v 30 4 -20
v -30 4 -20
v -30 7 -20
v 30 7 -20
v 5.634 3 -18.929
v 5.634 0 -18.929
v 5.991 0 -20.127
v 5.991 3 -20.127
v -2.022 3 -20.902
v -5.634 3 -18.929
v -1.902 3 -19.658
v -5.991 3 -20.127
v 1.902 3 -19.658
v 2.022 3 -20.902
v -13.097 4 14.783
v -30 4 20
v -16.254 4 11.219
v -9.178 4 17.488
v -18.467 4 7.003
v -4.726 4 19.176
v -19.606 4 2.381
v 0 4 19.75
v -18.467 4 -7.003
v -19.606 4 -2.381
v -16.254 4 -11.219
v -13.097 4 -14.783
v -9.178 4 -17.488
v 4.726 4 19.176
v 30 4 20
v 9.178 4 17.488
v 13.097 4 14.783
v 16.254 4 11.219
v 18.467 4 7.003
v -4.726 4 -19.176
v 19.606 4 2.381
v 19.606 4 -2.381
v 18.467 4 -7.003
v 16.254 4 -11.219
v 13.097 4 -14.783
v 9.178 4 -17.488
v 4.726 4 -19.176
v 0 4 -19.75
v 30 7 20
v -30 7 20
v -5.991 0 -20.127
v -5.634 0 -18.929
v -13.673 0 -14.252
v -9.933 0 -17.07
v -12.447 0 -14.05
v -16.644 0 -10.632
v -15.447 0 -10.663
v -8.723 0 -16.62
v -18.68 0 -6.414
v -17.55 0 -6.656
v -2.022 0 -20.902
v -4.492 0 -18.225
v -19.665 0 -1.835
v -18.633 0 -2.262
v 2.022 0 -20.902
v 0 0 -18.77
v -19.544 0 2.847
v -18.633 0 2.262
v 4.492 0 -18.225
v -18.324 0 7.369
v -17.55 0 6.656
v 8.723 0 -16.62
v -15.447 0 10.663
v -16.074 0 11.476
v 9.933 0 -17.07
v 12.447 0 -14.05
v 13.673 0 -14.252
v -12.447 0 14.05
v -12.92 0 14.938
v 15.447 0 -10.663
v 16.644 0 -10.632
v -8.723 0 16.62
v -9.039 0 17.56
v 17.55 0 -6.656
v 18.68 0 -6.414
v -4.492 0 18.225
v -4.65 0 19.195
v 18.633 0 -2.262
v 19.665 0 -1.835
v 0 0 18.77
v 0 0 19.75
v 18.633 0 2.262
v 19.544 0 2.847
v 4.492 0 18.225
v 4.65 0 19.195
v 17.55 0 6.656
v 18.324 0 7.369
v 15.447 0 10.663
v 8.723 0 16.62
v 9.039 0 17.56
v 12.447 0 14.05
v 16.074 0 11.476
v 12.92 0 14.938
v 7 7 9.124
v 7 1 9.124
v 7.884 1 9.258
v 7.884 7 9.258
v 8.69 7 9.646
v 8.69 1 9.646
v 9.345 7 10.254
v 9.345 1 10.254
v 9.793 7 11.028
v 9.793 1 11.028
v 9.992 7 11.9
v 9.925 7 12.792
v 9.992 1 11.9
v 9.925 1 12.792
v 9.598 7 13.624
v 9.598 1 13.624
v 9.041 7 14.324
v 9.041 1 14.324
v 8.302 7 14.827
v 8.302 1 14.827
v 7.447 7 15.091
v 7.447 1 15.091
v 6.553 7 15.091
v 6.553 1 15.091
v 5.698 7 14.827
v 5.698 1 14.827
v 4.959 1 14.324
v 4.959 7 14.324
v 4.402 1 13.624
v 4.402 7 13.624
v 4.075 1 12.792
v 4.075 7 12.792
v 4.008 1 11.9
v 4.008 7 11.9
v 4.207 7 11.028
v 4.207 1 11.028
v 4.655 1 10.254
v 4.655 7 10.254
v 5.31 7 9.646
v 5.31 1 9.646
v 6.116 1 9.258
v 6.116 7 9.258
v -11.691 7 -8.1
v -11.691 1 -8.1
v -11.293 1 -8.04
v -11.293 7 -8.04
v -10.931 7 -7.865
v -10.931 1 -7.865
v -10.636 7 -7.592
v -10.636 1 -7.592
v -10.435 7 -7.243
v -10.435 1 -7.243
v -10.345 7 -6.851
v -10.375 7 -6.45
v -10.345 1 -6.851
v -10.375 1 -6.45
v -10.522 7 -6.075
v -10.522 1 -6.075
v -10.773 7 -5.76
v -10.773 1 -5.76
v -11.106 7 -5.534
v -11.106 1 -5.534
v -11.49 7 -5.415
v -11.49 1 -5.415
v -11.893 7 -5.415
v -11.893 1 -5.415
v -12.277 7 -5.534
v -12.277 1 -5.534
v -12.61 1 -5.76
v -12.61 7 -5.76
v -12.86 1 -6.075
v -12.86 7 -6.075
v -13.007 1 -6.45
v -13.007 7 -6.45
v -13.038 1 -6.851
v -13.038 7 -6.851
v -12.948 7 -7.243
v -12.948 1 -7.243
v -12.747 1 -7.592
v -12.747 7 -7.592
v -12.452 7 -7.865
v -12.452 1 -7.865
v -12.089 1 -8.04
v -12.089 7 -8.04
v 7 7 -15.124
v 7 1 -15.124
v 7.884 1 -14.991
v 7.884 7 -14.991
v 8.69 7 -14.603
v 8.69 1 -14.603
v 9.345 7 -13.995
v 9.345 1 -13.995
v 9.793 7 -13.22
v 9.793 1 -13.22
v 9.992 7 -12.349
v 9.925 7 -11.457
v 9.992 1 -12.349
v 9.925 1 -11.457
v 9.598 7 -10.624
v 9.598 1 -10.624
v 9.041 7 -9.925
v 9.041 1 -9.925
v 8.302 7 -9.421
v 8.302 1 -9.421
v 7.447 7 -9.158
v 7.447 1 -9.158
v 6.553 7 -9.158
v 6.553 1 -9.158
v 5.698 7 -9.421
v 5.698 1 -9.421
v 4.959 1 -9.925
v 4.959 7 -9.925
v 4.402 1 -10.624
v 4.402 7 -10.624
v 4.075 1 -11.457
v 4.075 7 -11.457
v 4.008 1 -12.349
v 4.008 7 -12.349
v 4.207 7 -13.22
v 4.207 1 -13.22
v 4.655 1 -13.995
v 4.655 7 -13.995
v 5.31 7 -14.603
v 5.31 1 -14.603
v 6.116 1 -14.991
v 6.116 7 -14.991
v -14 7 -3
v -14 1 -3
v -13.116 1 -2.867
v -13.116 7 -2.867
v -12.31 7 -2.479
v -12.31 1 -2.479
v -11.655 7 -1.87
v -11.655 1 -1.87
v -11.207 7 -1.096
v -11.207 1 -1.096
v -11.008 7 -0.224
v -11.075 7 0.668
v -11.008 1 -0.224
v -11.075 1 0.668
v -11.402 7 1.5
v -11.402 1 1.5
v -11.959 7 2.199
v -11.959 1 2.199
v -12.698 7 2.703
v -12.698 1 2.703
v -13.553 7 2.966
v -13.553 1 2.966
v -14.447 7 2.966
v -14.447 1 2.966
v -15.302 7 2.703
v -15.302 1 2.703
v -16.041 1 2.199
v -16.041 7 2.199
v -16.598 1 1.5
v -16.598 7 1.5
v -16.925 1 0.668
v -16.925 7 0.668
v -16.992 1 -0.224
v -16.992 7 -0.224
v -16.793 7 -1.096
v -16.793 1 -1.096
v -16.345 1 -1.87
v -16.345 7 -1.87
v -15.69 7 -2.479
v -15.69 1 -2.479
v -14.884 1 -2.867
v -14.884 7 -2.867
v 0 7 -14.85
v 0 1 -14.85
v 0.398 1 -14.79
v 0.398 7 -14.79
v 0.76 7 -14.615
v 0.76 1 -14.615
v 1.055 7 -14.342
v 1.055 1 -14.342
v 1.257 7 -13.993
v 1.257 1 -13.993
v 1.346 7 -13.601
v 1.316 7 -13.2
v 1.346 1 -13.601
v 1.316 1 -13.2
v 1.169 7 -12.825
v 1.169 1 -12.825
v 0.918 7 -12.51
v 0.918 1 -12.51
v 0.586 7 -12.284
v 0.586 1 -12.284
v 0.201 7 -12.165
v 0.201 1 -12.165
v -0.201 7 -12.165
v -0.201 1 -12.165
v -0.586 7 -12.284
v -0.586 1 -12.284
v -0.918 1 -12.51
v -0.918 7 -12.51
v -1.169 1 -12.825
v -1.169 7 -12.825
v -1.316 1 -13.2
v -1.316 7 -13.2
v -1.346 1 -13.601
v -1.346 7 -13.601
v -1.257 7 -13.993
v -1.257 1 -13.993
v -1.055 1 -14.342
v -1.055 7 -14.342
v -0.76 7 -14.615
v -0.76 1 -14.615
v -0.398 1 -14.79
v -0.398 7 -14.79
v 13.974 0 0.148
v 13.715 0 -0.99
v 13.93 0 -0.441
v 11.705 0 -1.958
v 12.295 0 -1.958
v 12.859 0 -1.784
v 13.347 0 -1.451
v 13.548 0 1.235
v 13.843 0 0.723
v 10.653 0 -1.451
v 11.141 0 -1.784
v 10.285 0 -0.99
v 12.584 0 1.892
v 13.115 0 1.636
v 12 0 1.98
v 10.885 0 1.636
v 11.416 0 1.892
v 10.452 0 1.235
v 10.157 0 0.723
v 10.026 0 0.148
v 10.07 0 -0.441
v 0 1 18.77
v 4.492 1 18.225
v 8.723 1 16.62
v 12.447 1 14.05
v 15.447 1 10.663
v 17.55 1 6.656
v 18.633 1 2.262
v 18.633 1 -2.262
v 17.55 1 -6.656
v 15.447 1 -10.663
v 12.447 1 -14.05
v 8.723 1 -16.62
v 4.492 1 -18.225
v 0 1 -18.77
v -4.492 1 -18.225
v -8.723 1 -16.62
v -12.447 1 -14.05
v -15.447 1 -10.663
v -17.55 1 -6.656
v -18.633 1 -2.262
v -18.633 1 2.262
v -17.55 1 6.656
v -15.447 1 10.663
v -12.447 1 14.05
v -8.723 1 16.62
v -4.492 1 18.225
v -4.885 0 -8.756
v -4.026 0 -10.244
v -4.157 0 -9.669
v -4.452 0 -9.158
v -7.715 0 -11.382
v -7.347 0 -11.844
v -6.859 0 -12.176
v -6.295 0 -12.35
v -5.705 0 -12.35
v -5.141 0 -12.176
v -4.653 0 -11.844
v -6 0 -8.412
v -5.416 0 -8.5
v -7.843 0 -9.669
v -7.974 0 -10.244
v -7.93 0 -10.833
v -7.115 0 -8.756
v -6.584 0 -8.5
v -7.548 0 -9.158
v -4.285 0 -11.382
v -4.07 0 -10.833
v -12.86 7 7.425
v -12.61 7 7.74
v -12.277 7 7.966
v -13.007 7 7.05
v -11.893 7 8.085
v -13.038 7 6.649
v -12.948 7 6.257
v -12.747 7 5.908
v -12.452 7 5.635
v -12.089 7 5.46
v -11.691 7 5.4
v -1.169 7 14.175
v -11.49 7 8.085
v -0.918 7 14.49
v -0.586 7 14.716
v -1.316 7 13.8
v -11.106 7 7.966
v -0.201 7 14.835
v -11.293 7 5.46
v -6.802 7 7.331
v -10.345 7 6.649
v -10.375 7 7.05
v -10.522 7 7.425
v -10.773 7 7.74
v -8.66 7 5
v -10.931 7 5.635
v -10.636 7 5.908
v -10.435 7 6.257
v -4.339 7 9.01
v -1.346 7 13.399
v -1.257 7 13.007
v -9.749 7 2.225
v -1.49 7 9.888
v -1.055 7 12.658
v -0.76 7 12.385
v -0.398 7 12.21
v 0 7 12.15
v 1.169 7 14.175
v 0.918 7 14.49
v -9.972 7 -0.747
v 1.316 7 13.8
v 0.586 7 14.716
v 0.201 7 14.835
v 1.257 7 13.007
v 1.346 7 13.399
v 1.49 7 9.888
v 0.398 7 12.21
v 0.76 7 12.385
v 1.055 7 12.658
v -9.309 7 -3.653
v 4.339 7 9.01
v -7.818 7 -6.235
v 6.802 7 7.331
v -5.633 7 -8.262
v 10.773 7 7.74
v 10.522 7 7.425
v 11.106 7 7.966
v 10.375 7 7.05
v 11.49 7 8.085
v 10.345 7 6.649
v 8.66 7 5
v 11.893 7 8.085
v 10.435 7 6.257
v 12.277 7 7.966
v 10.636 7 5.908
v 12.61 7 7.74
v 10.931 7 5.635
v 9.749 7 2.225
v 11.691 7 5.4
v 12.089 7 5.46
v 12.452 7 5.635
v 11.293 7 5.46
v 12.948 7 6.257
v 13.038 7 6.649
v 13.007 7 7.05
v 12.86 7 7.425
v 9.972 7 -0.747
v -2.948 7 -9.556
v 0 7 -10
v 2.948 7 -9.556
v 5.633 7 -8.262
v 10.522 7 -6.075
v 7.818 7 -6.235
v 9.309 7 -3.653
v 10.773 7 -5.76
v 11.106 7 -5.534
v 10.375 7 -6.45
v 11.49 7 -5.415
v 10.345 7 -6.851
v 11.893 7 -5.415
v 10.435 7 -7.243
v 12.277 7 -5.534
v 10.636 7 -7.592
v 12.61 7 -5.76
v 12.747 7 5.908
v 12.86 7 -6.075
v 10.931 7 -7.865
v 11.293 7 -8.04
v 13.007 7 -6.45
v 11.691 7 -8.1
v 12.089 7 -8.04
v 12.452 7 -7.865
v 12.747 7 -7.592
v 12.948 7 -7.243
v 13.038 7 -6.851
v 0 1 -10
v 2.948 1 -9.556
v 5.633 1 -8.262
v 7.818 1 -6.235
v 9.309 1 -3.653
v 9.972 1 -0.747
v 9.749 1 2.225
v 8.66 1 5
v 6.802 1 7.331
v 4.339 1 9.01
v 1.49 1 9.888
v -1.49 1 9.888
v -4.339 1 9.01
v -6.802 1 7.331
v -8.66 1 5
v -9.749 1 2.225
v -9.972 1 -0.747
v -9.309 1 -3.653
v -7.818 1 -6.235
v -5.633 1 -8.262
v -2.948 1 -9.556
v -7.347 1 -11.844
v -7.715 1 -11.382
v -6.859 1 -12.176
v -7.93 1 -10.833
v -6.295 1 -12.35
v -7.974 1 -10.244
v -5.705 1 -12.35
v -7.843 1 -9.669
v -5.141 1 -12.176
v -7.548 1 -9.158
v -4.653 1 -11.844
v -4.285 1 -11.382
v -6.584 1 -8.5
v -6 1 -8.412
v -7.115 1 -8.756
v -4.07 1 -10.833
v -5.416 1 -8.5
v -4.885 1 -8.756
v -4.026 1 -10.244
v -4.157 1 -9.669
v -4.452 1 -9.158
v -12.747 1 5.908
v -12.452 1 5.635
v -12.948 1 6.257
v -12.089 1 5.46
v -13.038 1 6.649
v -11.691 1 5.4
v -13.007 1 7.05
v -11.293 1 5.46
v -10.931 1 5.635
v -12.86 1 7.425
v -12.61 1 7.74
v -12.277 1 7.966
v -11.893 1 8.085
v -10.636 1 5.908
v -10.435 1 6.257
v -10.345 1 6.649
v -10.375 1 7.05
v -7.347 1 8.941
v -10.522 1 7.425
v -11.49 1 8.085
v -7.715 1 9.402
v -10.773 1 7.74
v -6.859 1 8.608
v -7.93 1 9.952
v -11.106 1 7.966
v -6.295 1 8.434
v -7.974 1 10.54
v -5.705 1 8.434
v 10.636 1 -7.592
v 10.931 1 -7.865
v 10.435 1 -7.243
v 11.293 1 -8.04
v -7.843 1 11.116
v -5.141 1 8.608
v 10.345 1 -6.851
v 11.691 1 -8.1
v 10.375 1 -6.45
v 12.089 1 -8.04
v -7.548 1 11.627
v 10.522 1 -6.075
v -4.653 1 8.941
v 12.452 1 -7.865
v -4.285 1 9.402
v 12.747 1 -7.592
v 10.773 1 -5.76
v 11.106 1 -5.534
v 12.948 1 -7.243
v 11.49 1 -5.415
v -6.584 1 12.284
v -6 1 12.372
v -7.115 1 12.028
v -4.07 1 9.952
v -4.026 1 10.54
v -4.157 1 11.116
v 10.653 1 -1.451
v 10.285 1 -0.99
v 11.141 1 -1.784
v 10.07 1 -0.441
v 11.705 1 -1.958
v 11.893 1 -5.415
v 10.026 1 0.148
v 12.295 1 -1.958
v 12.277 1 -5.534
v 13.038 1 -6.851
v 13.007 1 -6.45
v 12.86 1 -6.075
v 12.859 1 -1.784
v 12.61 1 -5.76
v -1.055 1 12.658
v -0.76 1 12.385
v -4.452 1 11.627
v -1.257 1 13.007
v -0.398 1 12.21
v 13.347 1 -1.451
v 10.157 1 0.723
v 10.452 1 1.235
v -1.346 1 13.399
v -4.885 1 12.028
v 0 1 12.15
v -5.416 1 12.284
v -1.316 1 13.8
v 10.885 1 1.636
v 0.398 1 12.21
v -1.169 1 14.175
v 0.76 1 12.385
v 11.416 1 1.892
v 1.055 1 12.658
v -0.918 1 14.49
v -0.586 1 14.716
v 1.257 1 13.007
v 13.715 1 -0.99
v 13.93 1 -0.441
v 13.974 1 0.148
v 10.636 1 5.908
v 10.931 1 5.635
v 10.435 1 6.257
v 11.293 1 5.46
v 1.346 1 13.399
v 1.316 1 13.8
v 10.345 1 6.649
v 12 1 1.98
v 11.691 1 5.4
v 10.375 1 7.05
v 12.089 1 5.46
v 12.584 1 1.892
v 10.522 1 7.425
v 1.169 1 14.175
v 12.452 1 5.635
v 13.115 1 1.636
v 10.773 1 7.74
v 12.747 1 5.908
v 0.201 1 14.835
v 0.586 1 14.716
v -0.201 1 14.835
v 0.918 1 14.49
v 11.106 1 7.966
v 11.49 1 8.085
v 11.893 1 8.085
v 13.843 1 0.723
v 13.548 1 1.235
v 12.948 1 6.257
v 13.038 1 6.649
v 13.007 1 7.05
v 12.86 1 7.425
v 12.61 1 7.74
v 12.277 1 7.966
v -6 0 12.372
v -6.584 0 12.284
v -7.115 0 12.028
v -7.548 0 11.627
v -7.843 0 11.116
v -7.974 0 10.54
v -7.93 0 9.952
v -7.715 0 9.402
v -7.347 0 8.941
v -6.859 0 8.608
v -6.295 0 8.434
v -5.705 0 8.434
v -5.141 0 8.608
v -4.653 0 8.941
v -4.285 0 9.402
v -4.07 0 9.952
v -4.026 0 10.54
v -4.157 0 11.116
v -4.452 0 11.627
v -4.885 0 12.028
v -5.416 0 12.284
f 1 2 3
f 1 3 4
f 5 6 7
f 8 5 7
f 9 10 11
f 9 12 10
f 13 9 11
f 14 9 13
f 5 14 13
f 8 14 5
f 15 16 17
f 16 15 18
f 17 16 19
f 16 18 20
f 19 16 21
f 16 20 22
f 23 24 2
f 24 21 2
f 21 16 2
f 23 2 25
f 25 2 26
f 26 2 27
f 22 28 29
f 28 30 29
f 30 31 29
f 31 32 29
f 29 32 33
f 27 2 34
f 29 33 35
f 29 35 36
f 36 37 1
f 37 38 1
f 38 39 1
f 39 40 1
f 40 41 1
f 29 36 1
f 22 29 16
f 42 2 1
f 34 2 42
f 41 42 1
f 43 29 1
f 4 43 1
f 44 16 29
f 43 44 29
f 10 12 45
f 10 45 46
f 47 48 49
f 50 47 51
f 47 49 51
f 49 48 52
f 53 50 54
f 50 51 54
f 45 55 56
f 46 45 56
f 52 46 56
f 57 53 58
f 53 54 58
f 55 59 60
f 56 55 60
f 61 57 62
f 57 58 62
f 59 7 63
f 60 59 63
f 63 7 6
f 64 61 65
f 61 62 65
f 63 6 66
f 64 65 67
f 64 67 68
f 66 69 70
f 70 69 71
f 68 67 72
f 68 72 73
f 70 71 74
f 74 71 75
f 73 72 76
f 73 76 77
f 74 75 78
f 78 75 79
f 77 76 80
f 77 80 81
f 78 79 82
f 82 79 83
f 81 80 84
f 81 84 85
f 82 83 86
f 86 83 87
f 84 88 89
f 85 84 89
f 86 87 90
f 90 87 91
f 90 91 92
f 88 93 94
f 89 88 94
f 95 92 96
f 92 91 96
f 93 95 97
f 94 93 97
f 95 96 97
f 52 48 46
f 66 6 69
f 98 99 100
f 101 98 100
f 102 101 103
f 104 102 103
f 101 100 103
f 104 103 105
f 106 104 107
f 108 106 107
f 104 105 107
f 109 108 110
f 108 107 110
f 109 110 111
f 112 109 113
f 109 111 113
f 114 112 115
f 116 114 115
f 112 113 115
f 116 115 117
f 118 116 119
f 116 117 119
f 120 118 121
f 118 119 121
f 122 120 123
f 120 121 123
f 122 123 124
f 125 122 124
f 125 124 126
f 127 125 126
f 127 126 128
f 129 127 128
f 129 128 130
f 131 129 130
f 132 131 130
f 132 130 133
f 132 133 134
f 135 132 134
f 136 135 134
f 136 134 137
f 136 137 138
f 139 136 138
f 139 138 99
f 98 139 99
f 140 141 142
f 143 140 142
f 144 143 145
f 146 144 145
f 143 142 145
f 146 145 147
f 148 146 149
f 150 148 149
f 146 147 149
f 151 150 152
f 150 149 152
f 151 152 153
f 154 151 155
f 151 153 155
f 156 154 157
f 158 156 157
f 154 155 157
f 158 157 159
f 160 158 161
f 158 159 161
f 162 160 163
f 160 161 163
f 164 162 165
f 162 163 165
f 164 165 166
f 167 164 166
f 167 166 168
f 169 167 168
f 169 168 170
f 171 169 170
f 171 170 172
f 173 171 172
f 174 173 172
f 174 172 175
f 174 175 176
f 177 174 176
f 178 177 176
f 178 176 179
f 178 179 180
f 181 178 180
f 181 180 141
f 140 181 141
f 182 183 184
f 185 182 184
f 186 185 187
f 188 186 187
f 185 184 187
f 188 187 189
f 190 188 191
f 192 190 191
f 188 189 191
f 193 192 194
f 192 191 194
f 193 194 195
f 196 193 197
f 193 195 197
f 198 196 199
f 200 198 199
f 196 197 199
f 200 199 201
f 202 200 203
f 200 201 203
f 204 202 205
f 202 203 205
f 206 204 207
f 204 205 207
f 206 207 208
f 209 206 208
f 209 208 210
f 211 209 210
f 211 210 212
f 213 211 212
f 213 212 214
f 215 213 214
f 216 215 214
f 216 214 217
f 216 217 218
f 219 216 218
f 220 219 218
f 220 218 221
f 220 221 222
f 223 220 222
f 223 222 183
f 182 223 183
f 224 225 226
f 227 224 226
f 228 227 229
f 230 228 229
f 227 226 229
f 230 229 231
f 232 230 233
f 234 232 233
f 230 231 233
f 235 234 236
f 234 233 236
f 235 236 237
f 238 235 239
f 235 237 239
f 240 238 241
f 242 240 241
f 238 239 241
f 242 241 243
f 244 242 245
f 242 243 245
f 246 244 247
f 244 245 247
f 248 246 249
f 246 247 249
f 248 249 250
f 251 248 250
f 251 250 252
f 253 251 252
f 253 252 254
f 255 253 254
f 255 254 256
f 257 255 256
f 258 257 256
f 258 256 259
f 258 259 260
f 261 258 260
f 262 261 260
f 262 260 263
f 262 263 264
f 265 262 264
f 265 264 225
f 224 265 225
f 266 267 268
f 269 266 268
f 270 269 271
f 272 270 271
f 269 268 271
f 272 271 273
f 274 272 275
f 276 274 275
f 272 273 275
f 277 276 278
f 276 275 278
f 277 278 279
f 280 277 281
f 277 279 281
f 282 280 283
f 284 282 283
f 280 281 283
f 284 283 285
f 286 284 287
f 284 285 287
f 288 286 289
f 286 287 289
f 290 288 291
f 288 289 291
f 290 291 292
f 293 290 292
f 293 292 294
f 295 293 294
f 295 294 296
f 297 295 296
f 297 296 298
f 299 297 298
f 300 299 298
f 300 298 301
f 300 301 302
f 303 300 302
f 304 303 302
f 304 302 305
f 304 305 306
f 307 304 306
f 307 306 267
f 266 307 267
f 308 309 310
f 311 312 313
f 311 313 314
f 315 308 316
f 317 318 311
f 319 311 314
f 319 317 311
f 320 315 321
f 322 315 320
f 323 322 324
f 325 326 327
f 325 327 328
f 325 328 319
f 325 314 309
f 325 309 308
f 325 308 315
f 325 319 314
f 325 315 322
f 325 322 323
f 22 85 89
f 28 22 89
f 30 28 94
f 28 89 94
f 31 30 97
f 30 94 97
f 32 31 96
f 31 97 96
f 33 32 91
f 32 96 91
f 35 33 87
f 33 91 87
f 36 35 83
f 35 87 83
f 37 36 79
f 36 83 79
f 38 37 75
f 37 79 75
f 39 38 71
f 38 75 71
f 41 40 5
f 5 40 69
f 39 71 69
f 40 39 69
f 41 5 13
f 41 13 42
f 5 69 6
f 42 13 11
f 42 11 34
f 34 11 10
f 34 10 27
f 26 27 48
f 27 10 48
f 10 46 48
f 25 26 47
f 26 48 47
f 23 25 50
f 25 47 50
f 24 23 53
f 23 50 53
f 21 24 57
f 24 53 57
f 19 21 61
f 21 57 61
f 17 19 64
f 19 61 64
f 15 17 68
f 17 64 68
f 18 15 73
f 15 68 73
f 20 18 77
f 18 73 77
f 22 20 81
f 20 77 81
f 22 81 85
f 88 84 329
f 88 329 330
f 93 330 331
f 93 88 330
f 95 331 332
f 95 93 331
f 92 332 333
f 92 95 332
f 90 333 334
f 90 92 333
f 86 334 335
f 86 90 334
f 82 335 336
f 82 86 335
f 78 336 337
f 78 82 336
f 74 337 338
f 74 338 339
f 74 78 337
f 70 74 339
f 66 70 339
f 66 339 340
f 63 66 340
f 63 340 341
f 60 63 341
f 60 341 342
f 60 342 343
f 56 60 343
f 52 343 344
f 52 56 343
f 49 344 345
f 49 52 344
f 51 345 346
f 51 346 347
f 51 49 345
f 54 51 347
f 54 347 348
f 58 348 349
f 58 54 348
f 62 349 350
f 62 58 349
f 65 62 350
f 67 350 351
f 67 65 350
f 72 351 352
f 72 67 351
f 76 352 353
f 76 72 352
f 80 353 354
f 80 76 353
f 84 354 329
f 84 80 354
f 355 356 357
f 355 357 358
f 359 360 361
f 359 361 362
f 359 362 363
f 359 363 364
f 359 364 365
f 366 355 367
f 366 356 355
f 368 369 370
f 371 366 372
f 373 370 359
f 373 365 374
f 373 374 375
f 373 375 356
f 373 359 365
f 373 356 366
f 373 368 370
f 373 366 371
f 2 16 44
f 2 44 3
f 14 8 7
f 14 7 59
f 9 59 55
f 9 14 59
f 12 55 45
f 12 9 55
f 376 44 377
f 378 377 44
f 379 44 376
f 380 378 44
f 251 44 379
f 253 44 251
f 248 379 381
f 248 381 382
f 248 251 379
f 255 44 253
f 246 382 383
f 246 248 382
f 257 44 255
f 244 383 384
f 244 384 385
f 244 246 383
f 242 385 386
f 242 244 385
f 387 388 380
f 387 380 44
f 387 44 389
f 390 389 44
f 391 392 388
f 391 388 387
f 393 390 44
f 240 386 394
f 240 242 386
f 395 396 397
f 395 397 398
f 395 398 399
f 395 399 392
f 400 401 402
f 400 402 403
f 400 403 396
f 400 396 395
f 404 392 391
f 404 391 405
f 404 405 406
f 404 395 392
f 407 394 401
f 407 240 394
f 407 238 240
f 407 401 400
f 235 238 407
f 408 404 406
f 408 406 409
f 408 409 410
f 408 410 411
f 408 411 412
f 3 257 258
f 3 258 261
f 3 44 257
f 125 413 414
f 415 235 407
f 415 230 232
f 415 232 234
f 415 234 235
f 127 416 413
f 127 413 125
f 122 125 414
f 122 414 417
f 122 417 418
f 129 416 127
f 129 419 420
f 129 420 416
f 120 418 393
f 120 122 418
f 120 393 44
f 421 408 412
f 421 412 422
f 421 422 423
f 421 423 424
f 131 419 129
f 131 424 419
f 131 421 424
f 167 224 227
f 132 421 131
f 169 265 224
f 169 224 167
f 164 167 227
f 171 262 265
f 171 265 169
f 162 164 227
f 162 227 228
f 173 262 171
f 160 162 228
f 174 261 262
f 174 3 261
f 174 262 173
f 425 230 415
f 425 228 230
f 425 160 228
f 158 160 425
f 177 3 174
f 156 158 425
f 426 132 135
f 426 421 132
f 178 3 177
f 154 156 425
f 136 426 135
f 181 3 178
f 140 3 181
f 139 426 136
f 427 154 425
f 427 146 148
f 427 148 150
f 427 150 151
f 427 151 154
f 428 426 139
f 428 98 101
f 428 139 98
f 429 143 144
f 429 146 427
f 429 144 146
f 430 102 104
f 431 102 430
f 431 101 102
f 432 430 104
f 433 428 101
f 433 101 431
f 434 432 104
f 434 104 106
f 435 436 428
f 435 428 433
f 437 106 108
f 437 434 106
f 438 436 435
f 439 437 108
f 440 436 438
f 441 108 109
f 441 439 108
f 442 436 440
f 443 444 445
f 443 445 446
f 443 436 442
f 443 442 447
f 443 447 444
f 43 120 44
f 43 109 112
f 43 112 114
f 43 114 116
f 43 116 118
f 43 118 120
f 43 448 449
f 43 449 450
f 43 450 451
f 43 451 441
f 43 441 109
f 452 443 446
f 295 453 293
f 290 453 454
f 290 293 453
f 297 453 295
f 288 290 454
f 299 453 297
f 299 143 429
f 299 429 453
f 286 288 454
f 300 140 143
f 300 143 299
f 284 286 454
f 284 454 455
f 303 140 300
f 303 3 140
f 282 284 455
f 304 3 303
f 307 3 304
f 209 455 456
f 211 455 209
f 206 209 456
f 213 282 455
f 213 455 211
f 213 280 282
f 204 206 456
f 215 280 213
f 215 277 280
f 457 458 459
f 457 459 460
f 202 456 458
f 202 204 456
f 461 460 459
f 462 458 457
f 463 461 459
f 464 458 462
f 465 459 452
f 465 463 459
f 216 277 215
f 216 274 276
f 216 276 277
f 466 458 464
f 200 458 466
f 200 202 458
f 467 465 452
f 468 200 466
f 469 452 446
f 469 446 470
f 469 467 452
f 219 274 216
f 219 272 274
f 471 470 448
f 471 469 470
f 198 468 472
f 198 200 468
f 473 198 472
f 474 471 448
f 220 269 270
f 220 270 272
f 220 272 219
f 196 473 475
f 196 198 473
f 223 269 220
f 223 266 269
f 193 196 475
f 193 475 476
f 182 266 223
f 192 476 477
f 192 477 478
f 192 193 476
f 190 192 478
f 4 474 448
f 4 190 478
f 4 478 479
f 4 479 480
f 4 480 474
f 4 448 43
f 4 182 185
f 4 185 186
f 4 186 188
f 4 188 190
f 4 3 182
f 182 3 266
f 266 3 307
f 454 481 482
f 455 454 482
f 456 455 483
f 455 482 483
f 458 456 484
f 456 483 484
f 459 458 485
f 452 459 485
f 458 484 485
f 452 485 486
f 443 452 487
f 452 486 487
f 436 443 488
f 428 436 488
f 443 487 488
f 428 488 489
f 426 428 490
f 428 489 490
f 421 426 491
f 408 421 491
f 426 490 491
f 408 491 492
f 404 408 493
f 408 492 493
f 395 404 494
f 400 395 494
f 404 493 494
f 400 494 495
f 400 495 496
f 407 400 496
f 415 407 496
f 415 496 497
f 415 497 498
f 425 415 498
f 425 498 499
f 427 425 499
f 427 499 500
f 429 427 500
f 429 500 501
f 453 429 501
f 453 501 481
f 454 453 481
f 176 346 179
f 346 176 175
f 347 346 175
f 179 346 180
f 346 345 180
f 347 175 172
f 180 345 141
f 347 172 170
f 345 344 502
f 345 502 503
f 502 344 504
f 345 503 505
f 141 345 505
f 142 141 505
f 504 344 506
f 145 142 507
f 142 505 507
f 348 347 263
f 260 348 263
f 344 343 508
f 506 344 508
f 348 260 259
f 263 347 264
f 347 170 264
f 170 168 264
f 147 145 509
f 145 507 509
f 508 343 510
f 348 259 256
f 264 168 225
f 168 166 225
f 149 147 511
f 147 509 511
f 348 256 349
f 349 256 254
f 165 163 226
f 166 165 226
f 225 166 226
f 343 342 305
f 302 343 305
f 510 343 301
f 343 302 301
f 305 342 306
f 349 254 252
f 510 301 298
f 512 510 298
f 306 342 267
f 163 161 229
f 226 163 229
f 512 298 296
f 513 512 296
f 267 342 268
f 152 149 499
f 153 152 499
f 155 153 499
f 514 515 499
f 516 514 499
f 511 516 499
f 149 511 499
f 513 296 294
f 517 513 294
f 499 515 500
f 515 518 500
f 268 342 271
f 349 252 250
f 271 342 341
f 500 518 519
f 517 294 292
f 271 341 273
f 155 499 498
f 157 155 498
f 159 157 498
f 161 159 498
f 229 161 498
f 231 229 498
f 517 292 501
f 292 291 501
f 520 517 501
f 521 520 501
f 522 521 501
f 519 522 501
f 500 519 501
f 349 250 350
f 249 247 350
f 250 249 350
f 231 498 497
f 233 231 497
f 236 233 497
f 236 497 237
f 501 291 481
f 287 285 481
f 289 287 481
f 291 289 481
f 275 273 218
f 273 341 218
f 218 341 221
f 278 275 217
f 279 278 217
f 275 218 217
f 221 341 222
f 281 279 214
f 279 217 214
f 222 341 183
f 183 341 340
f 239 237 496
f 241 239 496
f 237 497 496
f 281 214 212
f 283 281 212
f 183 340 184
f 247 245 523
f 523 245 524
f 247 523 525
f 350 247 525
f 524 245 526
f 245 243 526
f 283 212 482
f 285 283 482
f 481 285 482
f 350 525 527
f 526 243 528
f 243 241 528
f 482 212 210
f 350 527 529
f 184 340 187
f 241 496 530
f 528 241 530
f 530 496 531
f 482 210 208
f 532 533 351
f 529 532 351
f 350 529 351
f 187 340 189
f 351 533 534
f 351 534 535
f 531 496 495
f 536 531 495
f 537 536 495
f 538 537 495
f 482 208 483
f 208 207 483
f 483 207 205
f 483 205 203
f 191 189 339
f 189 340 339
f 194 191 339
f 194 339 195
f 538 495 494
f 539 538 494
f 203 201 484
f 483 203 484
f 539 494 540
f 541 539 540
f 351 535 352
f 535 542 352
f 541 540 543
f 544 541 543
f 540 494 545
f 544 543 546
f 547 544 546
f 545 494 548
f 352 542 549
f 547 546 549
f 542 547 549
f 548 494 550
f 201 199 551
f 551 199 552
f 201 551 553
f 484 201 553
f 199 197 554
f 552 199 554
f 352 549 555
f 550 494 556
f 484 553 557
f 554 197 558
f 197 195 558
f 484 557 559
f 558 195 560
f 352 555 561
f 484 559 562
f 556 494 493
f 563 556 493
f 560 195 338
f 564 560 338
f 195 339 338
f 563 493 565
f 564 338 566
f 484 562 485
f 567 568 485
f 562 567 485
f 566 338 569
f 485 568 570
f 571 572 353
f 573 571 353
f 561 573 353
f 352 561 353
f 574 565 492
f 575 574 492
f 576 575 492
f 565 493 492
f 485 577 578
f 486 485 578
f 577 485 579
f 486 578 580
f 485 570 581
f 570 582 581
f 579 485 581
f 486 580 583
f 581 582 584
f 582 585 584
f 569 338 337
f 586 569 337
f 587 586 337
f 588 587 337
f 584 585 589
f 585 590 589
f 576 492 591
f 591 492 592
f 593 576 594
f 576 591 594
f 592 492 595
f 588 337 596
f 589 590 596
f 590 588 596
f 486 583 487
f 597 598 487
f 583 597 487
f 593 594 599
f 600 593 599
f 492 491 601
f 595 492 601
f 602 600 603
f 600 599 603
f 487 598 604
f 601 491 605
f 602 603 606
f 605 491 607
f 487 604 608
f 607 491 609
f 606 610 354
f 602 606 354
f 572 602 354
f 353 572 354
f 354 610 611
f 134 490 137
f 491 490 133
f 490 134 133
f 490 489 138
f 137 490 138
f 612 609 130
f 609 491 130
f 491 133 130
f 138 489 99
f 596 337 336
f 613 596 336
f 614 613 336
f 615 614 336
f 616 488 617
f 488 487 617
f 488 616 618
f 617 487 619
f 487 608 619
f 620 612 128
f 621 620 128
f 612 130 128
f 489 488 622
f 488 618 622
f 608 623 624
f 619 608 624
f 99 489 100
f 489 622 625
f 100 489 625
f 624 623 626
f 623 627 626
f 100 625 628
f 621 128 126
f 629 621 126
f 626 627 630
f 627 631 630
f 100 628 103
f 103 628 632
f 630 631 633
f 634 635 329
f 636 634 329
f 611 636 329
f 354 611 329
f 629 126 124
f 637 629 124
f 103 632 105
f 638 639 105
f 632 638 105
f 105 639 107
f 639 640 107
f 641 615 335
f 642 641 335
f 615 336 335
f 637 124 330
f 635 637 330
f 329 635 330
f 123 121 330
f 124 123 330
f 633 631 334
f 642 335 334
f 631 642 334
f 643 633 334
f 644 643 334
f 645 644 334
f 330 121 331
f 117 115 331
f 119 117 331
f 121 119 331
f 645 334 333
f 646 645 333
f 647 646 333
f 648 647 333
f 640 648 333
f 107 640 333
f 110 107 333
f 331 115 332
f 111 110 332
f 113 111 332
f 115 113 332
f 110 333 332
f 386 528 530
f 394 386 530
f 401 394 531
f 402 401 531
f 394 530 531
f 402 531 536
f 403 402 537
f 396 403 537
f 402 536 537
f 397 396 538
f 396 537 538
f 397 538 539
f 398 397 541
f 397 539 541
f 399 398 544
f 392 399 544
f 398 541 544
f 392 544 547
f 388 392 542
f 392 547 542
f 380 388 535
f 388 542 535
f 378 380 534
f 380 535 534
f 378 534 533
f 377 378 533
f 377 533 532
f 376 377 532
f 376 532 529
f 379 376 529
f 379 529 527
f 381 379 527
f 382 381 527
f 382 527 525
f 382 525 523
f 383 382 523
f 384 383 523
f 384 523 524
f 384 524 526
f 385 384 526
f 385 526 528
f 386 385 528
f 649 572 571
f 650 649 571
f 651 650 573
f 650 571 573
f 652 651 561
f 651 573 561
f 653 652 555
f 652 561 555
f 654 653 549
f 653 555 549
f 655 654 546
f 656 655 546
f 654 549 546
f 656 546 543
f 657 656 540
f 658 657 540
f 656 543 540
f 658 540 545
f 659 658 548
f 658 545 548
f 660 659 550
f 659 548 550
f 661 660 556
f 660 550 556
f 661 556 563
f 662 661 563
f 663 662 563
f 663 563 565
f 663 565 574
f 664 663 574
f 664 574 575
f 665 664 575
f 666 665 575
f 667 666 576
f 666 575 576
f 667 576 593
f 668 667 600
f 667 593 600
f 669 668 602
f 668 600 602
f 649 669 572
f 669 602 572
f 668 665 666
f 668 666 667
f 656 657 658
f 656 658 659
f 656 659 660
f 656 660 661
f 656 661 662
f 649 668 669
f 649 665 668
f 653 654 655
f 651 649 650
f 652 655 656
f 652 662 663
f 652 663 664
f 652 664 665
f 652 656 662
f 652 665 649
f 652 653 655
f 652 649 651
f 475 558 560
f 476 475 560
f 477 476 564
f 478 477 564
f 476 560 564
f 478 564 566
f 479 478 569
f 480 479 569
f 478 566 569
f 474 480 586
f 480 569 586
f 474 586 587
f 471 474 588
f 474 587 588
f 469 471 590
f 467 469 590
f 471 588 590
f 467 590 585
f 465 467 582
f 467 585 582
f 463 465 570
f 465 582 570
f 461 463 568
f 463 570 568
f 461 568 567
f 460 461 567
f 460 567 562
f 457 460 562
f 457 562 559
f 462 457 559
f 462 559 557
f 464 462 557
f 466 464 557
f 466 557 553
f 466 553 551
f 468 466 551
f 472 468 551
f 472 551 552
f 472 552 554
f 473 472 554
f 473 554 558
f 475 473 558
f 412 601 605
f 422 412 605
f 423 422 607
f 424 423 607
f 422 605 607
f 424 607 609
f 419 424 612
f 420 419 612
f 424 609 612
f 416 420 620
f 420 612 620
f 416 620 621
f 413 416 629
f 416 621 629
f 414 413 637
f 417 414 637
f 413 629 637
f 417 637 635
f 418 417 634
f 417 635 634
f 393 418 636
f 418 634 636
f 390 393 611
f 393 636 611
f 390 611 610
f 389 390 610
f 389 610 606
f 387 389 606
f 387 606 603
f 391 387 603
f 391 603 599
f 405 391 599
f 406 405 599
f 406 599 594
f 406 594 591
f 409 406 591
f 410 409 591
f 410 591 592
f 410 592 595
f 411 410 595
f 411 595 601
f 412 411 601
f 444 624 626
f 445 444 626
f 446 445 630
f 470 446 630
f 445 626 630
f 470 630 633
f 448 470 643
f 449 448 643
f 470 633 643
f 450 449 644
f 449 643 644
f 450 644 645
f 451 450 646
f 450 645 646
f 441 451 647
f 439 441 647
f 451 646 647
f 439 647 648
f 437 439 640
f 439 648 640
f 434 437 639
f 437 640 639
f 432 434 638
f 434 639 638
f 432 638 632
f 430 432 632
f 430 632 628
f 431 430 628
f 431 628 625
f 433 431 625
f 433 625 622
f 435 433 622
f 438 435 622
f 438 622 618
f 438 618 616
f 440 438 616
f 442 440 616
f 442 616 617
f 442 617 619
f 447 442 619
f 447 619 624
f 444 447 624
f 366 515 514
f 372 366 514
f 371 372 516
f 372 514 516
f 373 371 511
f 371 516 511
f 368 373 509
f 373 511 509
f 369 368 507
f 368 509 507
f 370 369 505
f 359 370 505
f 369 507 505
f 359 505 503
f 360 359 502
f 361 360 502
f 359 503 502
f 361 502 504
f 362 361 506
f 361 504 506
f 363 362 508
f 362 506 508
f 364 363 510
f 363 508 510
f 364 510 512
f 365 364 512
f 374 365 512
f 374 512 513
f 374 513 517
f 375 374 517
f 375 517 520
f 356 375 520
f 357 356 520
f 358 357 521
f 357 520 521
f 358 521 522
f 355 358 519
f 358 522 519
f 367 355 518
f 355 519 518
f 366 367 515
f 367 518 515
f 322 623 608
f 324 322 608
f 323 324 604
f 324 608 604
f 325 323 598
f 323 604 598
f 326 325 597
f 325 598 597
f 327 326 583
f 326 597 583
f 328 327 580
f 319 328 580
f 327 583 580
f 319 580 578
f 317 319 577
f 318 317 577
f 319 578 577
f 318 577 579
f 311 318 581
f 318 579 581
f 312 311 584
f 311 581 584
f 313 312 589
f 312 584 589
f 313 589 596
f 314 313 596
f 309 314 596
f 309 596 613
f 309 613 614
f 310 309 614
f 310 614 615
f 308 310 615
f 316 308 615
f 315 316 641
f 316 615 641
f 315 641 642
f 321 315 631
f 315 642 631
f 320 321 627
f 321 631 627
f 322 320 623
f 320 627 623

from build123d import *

# Parameters (mm, degrees)
SKETCH_1_R           = 19.75
SKETCH_1_R_2         = 18.77
EXTRUDE_1_DEPTH      = 1
SKETCH_2_R           = 19.75
EXTRUDE_2_DEPTH      = 6
SKETCH_5_R           = 1.35
SKETCH_5_R_2         = 10
CUT_EXTRUDE_2_DEPTH  = 29.567901568
SKETCH_6_R           = 1.98
EXTRUDE_4_DEPTH      = 1
EXTRUDE_START        = -3
SKETCH_11_W          = 60
SKETCH_11_H          = 40
SKETCH_11_R          = 19.75
EXTRUDE_6_DEPTH      = 3
SKETCH_7_R           = 3
CUT_EXTRUDE_7_DEPTH  = 20
EXTRUDE_7_DEPTH      = 1
EXTRUDE_7_DEPTH_BACK = 2


with BuildPart() as part:
    # 草图1 → 凸台-拉伸1 (new body)
    with BuildSketch(Plane(origin=(0, 0, 0), x_dir=(1, 0, 0), z_dir=(0, 1, 0))):
        with Locations(Location((0, 0, 0), (0, 0, 270))):
            Circle(SKETCH_1_R)
        with Locations(Location((0, 0, 0), (0, 0, 270))):
            Circle(SKETCH_1_R_2, mode=Mode.SUBTRACT)
    extrude(amount=EXTRUDE_1_DEPTH)

    # 草图2 → 凸台-拉伸2 (add)
    with BuildSketch(Plane(origin=(0, 1, 0), x_dir=(1, 0, 0), z_dir=(0, 1, 0))):
        with Locations(Location((0, 0, 0), (0, 0, 270))):
            Circle(SKETCH_2_R)
    extrude(amount=EXTRUDE_2_DEPTH)

    # 草图5 → 切除-拉伸2 (cut, through all)
    with BuildSketch(Plane.XZ.offset(-1)):
        with Locations(Location((0, 13.5, 0), (0, 0, 270))):
            Circle(SKETCH_5_R)
        with Locations(Location((11.691342951, 6.75, 0), (0, 0, 270))):
            Circle(SKETCH_5_R)
        with Locations(Location((11.691342951, -6.75, 0), (0, 0, 270))):
            Circle(SKETCH_5_R)
        with Locations(Location((0, -13.5, 0), (0, 0, 270))):
            Circle(SKETCH_5_R)
        with Locations(Location((-11.691342951, -6.75, 0), (0, 0, 270))):
            Circle(SKETCH_5_R)
        with Locations(Location((-11.691342951, 6.75, 0), (0, 0, 270))):
            Circle(SKETCH_5_R)
        with Locations(Location((0, 0, 0), (0, 0, 270))):
            Circle(SKETCH_5_R_2)
    extrude(amount=-CUT_EXTRUDE_2_DEPTH, mode=Mode.SUBTRACT)

    # 草图6 → 凸台-拉伸4 (add)
    with BuildSketch(Plane.XZ.offset(-1)):
        with Locations(Location((12, 0, 0), (0, 0, 90))):
            Circle(SKETCH_6_R)
        with Locations(Location((-6, -10.392304845, 0), (0, 0, 90))):
            Circle(SKETCH_6_R)
        with Locations(Location((-6, 10.392304845, 0), (0, 0, 90))):
            Circle(SKETCH_6_R)
    extrude(amount=EXTRUDE_4_DEPTH)

    # 草图11 → 凸台-拉伸6 (add)
    with BuildSketch(Plane(origin=(0, 7, 0), x_dir=(1, 0, 0), z_dir=(0, 1, 0)).offset(EXTRUDE_START)):
        Rectangle(SKETCH_11_W, SKETCH_11_H)
        with Locations(Location((0, 0, 0), (0, 0, 270))):
            Circle(SKETCH_11_R, mode=Mode.SUBTRACT)
    extrude(amount=EXTRUDE_6_DEPTH)

    # 草图7 → 切除-拉伸7 (cut)
    with BuildSketch(Plane.XZ.offset(-1)):
        with Locations(Location((-14, 0, 0), (0, 0, 270))):
            Circle(SKETCH_7_R)
        with Locations(Location((7, 12.124355653, 0), (0, 0, 270))):
            Circle(SKETCH_7_R)
        with Locations(Location((7, -12.124355653, 0), (0, 0, 270))):
            Circle(SKETCH_7_R)
    extrude(amount=-CUT_EXTRUDE_7_DEPTH, mode=Mode.SUBTRACT)

    # 草图15 → 凸台-拉伸7 (add, two sides: drawn at the far end of the back side and taken through both)
    with BuildSketch(Plane(origin=(0, 1, 0), x_dir=(-1, 0, 0), z_dir=(0, -1, 0)).offset(-EXTRUDE_7_DEPTH_BACK)):
        with BuildLine():
            Line((-5.518906371, 18.541790589), (-5.99084035, 20.127340408))
            ThreePointArc((-5.99084035, 20.127340408), (0, 21), (5.99084035, 20.127340408))
            Line((5.99084035, 20.127340408), (5.518906371, 18.541790589))
            ThreePointArc((5.518906371, 18.541790589), (0, 19.345705616), (-5.518906371, 18.541790589))
        make_face()
    extrude(amount=EXTRUDE_7_DEPTH + EXTRUDE_7_DEPTH_BACK)


solid = part.part
